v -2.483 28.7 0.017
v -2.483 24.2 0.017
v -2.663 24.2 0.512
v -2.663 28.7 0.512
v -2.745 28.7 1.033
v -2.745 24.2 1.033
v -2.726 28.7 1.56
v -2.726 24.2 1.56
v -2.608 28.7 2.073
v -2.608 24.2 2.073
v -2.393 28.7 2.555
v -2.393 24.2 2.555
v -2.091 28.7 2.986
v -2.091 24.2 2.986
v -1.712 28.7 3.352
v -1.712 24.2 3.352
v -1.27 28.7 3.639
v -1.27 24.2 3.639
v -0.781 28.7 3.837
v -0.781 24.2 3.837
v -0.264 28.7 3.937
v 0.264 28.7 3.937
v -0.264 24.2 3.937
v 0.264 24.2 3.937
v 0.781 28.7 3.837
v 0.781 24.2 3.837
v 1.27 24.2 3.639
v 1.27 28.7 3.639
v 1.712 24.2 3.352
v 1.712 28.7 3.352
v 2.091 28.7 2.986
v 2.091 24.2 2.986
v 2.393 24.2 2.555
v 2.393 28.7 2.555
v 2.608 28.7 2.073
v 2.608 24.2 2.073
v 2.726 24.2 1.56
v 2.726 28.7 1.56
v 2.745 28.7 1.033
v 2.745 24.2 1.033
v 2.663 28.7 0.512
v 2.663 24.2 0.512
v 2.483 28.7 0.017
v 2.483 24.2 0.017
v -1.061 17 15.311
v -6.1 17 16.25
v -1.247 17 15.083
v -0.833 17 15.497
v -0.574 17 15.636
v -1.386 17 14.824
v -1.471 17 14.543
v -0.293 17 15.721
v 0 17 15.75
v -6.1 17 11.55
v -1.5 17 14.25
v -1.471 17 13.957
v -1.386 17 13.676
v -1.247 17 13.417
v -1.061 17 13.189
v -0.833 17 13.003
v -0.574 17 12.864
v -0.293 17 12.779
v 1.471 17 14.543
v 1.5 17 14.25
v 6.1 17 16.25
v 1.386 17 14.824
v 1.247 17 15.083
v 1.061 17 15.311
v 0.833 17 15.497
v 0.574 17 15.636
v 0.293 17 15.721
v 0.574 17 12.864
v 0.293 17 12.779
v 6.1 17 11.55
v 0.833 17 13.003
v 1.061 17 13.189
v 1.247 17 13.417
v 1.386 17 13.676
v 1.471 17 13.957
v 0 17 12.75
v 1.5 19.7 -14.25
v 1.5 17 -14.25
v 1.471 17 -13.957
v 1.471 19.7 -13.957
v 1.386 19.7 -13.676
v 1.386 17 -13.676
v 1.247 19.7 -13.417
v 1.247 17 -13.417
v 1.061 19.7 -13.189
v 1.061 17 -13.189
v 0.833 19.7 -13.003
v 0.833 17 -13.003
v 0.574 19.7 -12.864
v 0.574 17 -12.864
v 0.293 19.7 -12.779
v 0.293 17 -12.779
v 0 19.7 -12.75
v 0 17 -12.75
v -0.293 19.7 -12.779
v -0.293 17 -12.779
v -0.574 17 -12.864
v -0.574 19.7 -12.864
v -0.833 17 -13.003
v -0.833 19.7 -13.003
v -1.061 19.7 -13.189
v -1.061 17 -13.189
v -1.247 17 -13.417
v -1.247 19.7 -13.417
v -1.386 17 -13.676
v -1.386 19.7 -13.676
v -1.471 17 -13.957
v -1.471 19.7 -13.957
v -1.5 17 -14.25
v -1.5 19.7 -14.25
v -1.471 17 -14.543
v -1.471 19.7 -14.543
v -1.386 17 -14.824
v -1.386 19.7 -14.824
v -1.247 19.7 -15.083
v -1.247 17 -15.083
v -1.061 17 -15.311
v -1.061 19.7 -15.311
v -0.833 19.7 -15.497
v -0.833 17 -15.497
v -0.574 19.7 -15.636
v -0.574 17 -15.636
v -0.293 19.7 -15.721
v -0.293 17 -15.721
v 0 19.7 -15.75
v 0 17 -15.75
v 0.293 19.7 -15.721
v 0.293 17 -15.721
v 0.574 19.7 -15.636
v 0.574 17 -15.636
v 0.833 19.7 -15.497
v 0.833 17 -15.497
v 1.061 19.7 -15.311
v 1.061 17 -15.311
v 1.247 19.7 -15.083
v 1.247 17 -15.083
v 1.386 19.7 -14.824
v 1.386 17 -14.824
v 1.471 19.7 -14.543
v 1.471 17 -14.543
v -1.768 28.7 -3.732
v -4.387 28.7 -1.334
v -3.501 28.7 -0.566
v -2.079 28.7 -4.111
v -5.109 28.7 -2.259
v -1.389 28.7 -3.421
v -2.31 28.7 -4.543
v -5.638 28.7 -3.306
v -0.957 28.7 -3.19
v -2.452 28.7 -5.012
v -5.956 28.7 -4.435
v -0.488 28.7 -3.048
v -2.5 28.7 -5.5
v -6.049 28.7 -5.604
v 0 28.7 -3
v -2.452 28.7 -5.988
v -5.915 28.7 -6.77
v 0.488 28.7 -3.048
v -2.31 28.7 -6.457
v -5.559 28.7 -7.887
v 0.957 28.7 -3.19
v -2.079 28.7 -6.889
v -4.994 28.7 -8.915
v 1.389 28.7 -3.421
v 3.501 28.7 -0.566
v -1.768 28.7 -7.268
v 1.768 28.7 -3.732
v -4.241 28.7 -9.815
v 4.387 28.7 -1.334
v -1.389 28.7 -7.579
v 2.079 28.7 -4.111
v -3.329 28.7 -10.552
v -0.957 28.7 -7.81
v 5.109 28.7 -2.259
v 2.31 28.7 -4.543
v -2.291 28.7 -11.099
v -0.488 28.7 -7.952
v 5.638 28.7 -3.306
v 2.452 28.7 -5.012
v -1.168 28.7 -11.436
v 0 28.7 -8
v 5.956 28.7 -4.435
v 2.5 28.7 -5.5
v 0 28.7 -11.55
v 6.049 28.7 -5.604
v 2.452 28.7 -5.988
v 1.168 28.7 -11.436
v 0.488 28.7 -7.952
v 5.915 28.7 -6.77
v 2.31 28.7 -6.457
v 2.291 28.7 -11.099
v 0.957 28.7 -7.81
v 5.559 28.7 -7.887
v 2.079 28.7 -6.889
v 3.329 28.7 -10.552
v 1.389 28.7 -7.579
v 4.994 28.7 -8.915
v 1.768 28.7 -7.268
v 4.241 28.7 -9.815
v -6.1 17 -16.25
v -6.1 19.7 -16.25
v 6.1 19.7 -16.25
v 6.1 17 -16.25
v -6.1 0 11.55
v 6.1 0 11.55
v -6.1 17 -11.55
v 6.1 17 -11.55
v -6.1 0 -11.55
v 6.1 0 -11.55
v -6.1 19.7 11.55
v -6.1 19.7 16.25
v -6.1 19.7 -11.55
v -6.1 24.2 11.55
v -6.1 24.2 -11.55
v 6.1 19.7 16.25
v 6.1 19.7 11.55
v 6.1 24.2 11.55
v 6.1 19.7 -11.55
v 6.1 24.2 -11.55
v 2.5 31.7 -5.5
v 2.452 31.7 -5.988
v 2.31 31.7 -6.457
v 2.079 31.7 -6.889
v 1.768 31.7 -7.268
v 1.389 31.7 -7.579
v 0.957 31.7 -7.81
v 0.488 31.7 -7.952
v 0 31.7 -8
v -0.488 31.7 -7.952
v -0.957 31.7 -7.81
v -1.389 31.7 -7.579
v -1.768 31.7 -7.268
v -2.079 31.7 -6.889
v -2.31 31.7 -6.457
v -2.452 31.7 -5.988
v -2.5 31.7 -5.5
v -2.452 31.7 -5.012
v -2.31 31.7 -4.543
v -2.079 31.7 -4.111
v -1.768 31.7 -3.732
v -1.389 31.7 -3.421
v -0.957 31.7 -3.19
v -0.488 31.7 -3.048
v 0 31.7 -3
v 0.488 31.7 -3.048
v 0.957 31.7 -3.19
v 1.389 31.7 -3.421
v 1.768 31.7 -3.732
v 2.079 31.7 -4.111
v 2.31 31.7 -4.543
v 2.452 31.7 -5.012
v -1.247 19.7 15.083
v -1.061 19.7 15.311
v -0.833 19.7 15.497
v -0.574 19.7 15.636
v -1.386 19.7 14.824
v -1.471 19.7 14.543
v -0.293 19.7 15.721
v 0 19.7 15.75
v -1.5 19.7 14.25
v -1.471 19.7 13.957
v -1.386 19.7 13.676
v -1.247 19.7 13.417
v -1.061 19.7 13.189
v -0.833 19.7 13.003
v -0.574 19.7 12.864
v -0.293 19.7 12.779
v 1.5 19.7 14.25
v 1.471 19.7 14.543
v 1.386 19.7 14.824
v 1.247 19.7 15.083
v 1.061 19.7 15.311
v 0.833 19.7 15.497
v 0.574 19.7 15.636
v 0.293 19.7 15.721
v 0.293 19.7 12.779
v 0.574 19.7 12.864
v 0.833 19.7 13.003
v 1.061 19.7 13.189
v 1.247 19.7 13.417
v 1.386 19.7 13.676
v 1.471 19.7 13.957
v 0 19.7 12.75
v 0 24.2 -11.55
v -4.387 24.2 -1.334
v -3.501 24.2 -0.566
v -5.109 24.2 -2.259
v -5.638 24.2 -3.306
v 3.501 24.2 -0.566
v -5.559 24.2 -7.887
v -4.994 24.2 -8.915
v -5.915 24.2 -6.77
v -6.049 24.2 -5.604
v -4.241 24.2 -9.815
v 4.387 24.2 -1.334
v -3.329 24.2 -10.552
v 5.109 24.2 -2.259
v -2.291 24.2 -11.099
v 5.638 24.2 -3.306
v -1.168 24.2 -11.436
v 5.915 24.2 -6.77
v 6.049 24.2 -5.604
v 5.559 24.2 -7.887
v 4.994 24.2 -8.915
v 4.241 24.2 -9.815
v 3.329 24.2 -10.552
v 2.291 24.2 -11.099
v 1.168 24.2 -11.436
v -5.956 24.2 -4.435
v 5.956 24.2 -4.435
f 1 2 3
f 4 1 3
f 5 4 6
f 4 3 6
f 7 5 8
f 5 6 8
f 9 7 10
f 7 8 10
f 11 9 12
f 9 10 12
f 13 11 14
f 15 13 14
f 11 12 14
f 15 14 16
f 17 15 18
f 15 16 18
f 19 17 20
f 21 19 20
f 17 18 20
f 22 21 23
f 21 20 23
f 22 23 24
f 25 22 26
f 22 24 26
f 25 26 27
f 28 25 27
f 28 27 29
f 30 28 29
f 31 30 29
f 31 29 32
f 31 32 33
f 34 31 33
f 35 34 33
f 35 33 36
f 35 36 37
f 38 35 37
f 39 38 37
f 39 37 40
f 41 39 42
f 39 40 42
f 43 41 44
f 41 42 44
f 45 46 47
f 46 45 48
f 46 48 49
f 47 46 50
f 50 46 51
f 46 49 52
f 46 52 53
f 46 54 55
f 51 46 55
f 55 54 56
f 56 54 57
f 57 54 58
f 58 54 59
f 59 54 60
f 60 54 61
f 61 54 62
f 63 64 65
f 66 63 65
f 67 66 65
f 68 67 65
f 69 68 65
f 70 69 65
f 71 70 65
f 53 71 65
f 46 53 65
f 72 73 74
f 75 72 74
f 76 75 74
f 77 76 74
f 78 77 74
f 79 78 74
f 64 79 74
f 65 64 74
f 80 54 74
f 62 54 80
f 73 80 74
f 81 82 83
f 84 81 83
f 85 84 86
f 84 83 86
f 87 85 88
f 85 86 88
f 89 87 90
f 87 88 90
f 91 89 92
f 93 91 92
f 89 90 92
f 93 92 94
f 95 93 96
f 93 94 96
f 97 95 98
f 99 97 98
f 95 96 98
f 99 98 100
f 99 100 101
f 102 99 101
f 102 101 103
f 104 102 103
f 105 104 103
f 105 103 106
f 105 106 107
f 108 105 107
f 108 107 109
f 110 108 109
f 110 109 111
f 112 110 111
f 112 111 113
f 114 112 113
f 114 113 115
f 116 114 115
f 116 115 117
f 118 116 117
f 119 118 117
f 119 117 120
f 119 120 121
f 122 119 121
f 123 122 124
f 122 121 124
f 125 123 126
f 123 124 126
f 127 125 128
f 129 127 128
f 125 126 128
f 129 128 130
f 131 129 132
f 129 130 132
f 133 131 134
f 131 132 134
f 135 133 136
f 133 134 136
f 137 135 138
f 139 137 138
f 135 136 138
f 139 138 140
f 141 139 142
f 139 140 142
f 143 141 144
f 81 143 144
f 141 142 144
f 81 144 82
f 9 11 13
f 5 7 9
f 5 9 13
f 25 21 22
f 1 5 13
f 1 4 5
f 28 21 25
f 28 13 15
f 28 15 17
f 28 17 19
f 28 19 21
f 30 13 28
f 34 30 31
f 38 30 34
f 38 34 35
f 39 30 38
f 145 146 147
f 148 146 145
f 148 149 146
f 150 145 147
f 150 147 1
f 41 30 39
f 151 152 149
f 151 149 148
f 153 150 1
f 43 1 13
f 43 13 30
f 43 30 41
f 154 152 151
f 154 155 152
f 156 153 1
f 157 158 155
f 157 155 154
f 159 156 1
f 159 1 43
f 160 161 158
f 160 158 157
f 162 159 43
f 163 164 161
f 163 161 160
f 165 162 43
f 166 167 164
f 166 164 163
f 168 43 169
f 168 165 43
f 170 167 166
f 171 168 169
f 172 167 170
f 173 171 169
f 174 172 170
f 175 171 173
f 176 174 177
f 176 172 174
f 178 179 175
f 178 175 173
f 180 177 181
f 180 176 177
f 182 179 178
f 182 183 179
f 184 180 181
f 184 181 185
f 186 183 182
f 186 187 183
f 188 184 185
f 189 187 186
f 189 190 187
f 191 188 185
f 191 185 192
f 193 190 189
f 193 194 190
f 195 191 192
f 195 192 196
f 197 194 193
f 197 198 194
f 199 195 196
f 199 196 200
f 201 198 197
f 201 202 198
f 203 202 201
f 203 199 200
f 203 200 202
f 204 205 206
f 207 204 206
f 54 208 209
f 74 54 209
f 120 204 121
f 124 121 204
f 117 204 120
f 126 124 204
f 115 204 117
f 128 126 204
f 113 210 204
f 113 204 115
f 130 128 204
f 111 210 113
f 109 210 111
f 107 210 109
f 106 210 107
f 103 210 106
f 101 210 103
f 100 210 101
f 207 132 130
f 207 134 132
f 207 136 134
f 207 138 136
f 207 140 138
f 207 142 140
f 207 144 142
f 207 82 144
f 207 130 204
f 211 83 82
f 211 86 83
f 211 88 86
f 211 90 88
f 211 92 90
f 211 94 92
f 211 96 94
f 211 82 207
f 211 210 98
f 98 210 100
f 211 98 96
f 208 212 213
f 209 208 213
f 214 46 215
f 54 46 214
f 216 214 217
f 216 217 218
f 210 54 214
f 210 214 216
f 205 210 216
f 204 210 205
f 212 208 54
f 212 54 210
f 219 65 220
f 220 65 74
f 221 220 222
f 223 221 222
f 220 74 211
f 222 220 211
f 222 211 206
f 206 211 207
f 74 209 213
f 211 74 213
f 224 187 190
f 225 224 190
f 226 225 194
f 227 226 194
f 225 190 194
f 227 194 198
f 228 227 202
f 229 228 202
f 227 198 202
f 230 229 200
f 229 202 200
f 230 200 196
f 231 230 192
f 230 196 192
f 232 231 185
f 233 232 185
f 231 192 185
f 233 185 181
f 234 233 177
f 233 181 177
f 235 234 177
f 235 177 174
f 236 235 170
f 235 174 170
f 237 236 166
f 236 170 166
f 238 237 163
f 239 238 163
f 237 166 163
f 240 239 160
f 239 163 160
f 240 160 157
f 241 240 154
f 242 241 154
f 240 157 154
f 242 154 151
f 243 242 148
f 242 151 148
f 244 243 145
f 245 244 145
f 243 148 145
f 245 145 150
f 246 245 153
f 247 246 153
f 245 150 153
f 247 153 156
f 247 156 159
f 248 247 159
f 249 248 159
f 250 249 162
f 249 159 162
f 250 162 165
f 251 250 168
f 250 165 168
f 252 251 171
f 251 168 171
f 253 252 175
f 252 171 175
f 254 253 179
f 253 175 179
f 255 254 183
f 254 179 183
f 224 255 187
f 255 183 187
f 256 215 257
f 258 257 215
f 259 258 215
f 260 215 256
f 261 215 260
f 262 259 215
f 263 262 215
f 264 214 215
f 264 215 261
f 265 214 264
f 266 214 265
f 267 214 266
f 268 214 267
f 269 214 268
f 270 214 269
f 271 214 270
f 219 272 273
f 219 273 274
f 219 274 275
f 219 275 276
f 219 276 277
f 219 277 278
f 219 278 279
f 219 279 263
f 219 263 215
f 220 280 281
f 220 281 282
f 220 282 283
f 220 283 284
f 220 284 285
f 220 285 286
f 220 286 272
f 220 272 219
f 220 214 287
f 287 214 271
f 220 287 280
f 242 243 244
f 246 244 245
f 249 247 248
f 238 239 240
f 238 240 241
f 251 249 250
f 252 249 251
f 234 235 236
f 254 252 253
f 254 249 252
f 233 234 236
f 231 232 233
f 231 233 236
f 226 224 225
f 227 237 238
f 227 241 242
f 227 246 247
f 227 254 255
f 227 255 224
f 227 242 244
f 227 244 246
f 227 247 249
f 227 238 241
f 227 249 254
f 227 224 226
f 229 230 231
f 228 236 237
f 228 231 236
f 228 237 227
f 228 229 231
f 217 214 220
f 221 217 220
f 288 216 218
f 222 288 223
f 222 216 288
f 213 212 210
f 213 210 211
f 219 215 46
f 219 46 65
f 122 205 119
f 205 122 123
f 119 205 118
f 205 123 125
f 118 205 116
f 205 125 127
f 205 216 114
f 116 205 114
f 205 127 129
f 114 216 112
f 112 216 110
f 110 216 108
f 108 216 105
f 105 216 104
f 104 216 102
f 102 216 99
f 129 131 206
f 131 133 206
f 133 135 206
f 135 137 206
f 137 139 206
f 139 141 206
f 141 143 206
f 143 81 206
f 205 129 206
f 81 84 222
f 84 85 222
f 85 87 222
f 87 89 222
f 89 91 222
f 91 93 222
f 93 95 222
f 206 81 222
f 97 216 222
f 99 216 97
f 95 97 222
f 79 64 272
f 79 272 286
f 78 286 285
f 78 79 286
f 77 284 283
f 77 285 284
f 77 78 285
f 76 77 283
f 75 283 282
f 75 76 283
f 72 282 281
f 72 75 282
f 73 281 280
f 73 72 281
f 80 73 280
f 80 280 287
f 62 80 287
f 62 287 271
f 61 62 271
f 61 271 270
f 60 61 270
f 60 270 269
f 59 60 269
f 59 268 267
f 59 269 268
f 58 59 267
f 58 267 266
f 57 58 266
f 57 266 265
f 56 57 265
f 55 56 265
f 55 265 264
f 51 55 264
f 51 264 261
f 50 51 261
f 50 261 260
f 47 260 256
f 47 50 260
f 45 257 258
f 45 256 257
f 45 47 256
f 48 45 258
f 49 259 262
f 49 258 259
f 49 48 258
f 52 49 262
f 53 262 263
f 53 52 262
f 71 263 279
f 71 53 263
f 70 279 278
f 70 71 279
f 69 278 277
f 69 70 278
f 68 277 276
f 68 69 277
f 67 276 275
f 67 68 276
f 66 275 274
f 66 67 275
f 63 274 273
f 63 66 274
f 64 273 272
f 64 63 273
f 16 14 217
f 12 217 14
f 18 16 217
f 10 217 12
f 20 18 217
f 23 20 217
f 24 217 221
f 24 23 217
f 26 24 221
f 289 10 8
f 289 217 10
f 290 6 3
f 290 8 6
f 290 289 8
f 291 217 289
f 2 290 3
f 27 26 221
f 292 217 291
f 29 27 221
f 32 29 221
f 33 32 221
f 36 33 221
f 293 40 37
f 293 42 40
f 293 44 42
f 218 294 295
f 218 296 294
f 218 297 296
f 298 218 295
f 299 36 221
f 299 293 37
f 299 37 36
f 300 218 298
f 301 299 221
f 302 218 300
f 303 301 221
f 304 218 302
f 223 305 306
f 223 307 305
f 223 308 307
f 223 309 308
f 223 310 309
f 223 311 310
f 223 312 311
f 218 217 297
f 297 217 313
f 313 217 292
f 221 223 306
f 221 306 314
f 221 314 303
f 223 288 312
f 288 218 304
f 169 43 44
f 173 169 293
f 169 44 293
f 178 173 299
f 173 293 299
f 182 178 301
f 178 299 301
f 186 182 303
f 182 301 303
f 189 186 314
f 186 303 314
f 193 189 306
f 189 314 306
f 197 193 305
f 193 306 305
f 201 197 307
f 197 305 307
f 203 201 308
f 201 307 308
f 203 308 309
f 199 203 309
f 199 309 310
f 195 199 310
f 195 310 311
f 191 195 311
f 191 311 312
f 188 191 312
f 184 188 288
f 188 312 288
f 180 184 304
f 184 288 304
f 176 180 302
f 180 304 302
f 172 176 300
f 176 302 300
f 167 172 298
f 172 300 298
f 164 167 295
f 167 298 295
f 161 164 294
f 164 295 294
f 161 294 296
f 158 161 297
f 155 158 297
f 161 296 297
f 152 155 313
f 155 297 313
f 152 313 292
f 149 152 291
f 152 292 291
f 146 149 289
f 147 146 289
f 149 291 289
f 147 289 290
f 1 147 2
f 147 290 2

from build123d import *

# Parameters (mm, degrees)
SKETCH1_W           = 12.2
SKETCH1_H           = 23.1
BOSS_EXTRUDE3_DEPTH = 24.2
SKETCH5_W           = 12.2
SKETCH5_H           = 2.7
BOSS_EXTRUDE4_DEPTH = 4.7
CUT_EXTRUDE4_START  = -20.7
SKETCH6_R           = 1.5
CUT_EXTRUDE4_DEPTH  = 26.2
SKETCH7_R           = 2.75
SKETCH7_R_2         = 6.05
BOSS_EXTRUDE5_DEPTH = 4.5
SKETCH8_R           = 2.5
BOSS_EXTRUDE6_DEPTH = 3


with BuildPart() as part:
    # Sketch1 → Boss-Extrude3 (new body)
    with BuildSketch(Plane(origin=(0, 0, 0), x_dir=(1, 0, 0), z_dir=(0, 1, 0))):
        Rectangle(SKETCH1_W, SKETCH1_H)
    extrude(amount=BOSS_EXTRUDE3_DEPTH)

    # Sketch5 → Boss-Extrude4 (add)
    with BuildSketch(Plane.XY.offset(11.55)):
        with Locations((0, 18.35)):
            Rectangle(SKETCH5_W, SKETCH5_H)
    boss_extrude4 = extrude(amount=BOSS_EXTRUDE4_DEPTH)

    # Sketch6 → Cut-Extrude4 (cut)
    with BuildSketch(Plane(origin=(0, 19.7, 0), x_dir=(1, 0, 0), z_dir=(0, 1, 0)).offset(CUT_EXTRUDE4_START)):
        with Locations((0, -14.25)):
            Circle(SKETCH6_R)
    cut_extrude4 = extrude(amount=CUT_EXTRUDE4_DEPTH, mode=Mode.SUBTRACT)

    # Mirror3: Boss-Extrude4, Cut-Extrude4 across plane
    add(boss_extrude4.mirror(Plane.XY))
    add(cut_extrude4.mirror(Plane.XY), mode=Mode.SUBTRACT)

    # Sketch7 → Boss-Extrude5 (add)
    with BuildSketch(Plane(origin=(0, 24.2, 0), x_dir=(1, 0, 0), z_dir=(0, 1, 0))):
        with Locations((0, -1.2)):
            Circle(SKETCH7_R)
        with Locations((0, 5.5)):
            Circle(SKETCH7_R_2)
    extrude(amount=BOSS_EXTRUDE5_DEPTH)

    # Sketch8 → Boss-Extrude6 (add)
    with BuildSketch(Plane(origin=(0, 28.7, 0), x_dir=(1, 0, 0), z_dir=(0, 1, 0))):
        with Locations((0, 5.5)):
            Circle(SKETCH8_R)
    extrude(amount=BOSS_EXTRUDE6_DEPTH)


solid = part.part
